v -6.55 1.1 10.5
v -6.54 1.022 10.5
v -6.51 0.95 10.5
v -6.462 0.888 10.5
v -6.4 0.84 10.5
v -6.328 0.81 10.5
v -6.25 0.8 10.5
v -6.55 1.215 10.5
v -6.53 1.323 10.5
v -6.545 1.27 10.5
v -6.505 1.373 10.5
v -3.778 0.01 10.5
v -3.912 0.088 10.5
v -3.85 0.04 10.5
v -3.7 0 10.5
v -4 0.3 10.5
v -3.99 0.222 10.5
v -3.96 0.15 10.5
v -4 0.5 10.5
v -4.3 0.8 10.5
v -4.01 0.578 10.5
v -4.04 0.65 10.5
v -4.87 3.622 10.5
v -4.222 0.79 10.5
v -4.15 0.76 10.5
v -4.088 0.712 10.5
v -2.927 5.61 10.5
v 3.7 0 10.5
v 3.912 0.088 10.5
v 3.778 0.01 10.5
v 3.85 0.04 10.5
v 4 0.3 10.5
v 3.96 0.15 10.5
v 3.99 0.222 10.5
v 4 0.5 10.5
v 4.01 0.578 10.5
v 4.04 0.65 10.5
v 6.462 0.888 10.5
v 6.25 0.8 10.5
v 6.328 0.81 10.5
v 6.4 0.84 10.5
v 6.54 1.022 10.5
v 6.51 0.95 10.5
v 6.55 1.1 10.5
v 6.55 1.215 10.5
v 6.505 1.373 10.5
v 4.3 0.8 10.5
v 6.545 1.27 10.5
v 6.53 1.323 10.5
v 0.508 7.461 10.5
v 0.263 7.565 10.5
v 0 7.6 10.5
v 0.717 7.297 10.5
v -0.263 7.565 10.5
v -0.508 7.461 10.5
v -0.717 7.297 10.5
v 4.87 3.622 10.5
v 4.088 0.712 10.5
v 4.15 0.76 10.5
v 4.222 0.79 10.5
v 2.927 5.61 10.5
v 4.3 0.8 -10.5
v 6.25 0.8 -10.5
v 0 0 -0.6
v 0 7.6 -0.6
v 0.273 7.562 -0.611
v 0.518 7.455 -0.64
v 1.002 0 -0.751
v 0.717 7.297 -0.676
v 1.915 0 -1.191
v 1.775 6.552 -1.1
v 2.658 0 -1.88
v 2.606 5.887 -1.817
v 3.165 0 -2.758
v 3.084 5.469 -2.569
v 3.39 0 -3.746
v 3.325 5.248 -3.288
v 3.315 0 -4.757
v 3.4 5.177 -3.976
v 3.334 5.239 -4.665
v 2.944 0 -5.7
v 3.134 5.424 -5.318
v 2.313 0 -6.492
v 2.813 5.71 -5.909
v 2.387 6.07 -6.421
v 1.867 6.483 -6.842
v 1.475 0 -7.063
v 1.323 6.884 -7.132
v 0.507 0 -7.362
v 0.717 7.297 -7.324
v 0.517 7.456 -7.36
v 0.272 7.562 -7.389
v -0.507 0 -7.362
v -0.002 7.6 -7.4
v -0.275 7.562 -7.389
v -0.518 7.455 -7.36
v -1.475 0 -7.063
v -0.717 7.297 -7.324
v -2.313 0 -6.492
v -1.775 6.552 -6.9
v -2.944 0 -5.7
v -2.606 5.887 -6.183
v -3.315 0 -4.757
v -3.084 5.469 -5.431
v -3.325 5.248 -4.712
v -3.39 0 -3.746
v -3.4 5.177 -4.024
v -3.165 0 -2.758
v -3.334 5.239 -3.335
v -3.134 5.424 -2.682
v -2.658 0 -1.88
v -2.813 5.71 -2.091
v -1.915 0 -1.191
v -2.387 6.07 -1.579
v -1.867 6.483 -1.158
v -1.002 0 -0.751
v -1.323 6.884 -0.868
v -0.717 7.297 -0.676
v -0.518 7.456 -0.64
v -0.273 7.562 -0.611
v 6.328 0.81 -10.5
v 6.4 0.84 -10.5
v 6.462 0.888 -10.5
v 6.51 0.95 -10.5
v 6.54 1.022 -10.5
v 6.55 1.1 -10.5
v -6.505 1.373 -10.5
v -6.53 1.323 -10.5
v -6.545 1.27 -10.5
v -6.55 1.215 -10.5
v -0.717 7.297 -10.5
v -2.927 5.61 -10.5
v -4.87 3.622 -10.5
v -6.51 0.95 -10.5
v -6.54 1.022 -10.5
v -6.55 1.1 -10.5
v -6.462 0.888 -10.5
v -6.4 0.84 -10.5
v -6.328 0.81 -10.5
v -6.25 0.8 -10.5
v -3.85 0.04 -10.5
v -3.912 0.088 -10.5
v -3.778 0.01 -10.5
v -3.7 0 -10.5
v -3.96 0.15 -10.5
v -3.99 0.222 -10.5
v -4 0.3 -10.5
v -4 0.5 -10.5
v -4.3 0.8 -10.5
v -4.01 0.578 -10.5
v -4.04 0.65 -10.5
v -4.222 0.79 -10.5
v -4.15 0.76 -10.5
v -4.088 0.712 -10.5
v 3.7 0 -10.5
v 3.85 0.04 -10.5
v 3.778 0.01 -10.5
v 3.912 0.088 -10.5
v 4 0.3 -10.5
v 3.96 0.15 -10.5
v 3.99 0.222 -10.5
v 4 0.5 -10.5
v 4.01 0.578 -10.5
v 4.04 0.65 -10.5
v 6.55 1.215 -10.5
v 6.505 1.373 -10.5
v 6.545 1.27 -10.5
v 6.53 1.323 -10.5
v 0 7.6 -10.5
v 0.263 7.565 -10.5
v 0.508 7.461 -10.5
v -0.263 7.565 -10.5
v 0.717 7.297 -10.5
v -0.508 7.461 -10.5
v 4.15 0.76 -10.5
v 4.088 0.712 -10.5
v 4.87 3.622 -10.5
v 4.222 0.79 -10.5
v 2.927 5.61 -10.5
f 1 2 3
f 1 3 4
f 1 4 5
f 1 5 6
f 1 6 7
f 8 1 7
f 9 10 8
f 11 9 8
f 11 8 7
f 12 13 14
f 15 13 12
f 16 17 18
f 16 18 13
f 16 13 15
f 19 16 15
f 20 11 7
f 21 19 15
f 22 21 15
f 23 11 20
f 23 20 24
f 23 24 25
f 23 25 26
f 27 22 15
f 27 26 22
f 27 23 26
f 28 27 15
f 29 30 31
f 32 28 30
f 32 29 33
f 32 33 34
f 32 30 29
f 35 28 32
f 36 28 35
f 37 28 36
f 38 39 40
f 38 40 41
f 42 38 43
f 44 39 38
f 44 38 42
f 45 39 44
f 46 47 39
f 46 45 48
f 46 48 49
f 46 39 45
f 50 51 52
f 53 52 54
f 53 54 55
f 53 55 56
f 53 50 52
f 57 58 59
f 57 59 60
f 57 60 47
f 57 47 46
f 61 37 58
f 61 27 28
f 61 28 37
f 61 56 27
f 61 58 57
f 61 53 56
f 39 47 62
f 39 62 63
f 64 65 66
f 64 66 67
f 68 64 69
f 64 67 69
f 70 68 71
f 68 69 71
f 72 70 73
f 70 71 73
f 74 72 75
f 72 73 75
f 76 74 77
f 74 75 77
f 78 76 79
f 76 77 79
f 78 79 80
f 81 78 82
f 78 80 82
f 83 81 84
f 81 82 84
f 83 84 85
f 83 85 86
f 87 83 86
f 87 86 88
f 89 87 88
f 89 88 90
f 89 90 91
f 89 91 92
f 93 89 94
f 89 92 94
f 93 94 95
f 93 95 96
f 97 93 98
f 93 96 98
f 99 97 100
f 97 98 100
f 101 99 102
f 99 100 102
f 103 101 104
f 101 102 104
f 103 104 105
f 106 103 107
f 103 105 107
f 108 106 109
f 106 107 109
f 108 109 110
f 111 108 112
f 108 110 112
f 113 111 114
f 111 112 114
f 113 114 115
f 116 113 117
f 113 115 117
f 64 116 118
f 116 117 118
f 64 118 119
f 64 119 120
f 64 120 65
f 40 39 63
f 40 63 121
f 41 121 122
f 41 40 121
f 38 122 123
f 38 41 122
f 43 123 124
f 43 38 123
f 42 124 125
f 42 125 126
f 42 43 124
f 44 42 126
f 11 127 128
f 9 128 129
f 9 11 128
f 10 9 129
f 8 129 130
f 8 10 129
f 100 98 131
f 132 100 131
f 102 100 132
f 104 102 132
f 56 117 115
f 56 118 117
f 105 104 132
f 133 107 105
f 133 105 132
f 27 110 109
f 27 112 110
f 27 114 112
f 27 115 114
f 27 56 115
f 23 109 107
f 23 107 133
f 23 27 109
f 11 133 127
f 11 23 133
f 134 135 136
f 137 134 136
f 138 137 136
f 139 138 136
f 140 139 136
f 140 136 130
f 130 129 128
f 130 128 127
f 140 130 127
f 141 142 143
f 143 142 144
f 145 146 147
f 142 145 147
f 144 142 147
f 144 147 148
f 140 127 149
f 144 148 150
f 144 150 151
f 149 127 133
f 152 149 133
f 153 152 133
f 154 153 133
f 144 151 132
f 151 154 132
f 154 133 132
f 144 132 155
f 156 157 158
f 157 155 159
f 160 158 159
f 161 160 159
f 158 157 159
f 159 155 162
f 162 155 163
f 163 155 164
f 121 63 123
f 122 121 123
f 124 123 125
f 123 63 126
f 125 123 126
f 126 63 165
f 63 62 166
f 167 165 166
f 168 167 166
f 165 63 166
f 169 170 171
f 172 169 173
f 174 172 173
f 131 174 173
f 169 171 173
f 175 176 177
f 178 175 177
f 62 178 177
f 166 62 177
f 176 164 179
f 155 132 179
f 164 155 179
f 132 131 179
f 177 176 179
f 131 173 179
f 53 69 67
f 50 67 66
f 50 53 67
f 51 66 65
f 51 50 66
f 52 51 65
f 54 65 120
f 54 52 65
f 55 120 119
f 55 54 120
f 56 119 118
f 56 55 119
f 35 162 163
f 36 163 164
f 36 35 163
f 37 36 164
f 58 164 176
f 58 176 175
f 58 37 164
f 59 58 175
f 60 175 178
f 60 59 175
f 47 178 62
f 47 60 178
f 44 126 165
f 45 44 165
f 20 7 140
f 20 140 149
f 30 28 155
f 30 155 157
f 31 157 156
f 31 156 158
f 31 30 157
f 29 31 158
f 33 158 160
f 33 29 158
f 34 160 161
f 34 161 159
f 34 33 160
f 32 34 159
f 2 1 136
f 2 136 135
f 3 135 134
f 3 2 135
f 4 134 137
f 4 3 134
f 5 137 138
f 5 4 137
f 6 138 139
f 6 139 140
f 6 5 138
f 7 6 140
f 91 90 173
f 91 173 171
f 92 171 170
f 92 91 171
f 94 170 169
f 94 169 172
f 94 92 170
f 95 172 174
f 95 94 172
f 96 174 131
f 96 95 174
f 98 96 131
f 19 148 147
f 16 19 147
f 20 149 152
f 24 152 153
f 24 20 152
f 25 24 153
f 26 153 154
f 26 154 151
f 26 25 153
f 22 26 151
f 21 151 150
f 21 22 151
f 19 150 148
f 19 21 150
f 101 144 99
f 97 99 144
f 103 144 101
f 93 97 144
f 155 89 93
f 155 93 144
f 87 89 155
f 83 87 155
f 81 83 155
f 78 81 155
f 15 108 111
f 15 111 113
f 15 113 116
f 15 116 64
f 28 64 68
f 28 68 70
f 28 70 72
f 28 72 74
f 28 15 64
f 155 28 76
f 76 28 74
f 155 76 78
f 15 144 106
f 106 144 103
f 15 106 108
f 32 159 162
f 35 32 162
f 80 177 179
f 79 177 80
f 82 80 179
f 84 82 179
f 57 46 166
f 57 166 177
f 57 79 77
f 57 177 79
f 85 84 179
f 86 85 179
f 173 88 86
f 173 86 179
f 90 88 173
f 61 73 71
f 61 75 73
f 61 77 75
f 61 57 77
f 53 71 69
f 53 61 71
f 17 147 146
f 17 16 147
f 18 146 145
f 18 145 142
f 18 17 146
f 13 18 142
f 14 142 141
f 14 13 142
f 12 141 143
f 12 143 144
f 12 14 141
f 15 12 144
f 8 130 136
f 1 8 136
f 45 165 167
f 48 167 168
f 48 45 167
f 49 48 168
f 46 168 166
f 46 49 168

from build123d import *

# Parameters (mm, degrees)
EXTRUDE_1_DEPTH    = 10.5
HOLE_WIZARD_M8_1_D = 6.8


with BuildPart() as part:
    # 草图1 → 凸台-拉伸1 (new, symmetric)
    with BuildSketch(Plane.XY):
        with BuildLine():
            Line((-3.7, 0), (3.7, 0))
            ThreePointArc((3.7, 0), (3.912132034, 0.087867966), (4, 0.3))
            Line((4, 0.3), (4, 0.5))
            ThreePointArc((4, 0.5), (4.087867966, 0.712132034), (4.3, 0.8))
            Line((4.3, 0.8), (6.25, 0.8))
            ThreePointArc((6.25, 0.8), (6.462132034, 0.887867966), (6.55, 1.1))
            Line((6.55, 1.1), (6.55, 1.214694733))
            ThreePointArc((6.55, 1.214694733), (6.538468452, 1.297071625), (6.504760317, 1.37311563))
            ThreePointArc((6.504760317, 1.37311563), (3.934117906, 4.65105617), (0.716844819, 7.297232748))
            ThreePointArc((0.716844819, 7.297232748), (0, 7.6), (-0.716844819, 7.297232748))
            ThreePointArc((-0.716844819, 7.297232748), (-3.934117906, 4.65105617), (-6.504760317, 1.37311563))
            ThreePointArc((-6.504760317, 1.37311563), (-6.538468452, 1.297071625), (-6.55, 1.214694733))
            Line((-6.55, 1.214694733), (-6.55, 1.1))
            ThreePointArc((-6.55, 1.1), (-6.462132034, 0.887867966), (-6.25, 0.8))
            Line((-6.25, 0.8), (-4.3, 0.8))
            ThreePointArc((-4.3, 0.8), (-4.087867966, 0.712132034), (-4, 0.5))
            Line((-4, 0.5), (-4, 0.3))
            ThreePointArc((-4, 0.3), (-3.912132034, 0.087867966), (-3.7, 0))
        make_face()
    extrude(amount=EXTRUDE_1_DEPTH, both=True)

    # M8 螺纹孔1 (through all)
    with Locations(Plane(origin=(0, 0, -4), x_dir=(0, 0, -1), z_dir=(0, -1, 0))):
        with Locations((0, 0)):
            Hole(HOLE_WIZARD_M8_1_D / 2)


solid = part.part
